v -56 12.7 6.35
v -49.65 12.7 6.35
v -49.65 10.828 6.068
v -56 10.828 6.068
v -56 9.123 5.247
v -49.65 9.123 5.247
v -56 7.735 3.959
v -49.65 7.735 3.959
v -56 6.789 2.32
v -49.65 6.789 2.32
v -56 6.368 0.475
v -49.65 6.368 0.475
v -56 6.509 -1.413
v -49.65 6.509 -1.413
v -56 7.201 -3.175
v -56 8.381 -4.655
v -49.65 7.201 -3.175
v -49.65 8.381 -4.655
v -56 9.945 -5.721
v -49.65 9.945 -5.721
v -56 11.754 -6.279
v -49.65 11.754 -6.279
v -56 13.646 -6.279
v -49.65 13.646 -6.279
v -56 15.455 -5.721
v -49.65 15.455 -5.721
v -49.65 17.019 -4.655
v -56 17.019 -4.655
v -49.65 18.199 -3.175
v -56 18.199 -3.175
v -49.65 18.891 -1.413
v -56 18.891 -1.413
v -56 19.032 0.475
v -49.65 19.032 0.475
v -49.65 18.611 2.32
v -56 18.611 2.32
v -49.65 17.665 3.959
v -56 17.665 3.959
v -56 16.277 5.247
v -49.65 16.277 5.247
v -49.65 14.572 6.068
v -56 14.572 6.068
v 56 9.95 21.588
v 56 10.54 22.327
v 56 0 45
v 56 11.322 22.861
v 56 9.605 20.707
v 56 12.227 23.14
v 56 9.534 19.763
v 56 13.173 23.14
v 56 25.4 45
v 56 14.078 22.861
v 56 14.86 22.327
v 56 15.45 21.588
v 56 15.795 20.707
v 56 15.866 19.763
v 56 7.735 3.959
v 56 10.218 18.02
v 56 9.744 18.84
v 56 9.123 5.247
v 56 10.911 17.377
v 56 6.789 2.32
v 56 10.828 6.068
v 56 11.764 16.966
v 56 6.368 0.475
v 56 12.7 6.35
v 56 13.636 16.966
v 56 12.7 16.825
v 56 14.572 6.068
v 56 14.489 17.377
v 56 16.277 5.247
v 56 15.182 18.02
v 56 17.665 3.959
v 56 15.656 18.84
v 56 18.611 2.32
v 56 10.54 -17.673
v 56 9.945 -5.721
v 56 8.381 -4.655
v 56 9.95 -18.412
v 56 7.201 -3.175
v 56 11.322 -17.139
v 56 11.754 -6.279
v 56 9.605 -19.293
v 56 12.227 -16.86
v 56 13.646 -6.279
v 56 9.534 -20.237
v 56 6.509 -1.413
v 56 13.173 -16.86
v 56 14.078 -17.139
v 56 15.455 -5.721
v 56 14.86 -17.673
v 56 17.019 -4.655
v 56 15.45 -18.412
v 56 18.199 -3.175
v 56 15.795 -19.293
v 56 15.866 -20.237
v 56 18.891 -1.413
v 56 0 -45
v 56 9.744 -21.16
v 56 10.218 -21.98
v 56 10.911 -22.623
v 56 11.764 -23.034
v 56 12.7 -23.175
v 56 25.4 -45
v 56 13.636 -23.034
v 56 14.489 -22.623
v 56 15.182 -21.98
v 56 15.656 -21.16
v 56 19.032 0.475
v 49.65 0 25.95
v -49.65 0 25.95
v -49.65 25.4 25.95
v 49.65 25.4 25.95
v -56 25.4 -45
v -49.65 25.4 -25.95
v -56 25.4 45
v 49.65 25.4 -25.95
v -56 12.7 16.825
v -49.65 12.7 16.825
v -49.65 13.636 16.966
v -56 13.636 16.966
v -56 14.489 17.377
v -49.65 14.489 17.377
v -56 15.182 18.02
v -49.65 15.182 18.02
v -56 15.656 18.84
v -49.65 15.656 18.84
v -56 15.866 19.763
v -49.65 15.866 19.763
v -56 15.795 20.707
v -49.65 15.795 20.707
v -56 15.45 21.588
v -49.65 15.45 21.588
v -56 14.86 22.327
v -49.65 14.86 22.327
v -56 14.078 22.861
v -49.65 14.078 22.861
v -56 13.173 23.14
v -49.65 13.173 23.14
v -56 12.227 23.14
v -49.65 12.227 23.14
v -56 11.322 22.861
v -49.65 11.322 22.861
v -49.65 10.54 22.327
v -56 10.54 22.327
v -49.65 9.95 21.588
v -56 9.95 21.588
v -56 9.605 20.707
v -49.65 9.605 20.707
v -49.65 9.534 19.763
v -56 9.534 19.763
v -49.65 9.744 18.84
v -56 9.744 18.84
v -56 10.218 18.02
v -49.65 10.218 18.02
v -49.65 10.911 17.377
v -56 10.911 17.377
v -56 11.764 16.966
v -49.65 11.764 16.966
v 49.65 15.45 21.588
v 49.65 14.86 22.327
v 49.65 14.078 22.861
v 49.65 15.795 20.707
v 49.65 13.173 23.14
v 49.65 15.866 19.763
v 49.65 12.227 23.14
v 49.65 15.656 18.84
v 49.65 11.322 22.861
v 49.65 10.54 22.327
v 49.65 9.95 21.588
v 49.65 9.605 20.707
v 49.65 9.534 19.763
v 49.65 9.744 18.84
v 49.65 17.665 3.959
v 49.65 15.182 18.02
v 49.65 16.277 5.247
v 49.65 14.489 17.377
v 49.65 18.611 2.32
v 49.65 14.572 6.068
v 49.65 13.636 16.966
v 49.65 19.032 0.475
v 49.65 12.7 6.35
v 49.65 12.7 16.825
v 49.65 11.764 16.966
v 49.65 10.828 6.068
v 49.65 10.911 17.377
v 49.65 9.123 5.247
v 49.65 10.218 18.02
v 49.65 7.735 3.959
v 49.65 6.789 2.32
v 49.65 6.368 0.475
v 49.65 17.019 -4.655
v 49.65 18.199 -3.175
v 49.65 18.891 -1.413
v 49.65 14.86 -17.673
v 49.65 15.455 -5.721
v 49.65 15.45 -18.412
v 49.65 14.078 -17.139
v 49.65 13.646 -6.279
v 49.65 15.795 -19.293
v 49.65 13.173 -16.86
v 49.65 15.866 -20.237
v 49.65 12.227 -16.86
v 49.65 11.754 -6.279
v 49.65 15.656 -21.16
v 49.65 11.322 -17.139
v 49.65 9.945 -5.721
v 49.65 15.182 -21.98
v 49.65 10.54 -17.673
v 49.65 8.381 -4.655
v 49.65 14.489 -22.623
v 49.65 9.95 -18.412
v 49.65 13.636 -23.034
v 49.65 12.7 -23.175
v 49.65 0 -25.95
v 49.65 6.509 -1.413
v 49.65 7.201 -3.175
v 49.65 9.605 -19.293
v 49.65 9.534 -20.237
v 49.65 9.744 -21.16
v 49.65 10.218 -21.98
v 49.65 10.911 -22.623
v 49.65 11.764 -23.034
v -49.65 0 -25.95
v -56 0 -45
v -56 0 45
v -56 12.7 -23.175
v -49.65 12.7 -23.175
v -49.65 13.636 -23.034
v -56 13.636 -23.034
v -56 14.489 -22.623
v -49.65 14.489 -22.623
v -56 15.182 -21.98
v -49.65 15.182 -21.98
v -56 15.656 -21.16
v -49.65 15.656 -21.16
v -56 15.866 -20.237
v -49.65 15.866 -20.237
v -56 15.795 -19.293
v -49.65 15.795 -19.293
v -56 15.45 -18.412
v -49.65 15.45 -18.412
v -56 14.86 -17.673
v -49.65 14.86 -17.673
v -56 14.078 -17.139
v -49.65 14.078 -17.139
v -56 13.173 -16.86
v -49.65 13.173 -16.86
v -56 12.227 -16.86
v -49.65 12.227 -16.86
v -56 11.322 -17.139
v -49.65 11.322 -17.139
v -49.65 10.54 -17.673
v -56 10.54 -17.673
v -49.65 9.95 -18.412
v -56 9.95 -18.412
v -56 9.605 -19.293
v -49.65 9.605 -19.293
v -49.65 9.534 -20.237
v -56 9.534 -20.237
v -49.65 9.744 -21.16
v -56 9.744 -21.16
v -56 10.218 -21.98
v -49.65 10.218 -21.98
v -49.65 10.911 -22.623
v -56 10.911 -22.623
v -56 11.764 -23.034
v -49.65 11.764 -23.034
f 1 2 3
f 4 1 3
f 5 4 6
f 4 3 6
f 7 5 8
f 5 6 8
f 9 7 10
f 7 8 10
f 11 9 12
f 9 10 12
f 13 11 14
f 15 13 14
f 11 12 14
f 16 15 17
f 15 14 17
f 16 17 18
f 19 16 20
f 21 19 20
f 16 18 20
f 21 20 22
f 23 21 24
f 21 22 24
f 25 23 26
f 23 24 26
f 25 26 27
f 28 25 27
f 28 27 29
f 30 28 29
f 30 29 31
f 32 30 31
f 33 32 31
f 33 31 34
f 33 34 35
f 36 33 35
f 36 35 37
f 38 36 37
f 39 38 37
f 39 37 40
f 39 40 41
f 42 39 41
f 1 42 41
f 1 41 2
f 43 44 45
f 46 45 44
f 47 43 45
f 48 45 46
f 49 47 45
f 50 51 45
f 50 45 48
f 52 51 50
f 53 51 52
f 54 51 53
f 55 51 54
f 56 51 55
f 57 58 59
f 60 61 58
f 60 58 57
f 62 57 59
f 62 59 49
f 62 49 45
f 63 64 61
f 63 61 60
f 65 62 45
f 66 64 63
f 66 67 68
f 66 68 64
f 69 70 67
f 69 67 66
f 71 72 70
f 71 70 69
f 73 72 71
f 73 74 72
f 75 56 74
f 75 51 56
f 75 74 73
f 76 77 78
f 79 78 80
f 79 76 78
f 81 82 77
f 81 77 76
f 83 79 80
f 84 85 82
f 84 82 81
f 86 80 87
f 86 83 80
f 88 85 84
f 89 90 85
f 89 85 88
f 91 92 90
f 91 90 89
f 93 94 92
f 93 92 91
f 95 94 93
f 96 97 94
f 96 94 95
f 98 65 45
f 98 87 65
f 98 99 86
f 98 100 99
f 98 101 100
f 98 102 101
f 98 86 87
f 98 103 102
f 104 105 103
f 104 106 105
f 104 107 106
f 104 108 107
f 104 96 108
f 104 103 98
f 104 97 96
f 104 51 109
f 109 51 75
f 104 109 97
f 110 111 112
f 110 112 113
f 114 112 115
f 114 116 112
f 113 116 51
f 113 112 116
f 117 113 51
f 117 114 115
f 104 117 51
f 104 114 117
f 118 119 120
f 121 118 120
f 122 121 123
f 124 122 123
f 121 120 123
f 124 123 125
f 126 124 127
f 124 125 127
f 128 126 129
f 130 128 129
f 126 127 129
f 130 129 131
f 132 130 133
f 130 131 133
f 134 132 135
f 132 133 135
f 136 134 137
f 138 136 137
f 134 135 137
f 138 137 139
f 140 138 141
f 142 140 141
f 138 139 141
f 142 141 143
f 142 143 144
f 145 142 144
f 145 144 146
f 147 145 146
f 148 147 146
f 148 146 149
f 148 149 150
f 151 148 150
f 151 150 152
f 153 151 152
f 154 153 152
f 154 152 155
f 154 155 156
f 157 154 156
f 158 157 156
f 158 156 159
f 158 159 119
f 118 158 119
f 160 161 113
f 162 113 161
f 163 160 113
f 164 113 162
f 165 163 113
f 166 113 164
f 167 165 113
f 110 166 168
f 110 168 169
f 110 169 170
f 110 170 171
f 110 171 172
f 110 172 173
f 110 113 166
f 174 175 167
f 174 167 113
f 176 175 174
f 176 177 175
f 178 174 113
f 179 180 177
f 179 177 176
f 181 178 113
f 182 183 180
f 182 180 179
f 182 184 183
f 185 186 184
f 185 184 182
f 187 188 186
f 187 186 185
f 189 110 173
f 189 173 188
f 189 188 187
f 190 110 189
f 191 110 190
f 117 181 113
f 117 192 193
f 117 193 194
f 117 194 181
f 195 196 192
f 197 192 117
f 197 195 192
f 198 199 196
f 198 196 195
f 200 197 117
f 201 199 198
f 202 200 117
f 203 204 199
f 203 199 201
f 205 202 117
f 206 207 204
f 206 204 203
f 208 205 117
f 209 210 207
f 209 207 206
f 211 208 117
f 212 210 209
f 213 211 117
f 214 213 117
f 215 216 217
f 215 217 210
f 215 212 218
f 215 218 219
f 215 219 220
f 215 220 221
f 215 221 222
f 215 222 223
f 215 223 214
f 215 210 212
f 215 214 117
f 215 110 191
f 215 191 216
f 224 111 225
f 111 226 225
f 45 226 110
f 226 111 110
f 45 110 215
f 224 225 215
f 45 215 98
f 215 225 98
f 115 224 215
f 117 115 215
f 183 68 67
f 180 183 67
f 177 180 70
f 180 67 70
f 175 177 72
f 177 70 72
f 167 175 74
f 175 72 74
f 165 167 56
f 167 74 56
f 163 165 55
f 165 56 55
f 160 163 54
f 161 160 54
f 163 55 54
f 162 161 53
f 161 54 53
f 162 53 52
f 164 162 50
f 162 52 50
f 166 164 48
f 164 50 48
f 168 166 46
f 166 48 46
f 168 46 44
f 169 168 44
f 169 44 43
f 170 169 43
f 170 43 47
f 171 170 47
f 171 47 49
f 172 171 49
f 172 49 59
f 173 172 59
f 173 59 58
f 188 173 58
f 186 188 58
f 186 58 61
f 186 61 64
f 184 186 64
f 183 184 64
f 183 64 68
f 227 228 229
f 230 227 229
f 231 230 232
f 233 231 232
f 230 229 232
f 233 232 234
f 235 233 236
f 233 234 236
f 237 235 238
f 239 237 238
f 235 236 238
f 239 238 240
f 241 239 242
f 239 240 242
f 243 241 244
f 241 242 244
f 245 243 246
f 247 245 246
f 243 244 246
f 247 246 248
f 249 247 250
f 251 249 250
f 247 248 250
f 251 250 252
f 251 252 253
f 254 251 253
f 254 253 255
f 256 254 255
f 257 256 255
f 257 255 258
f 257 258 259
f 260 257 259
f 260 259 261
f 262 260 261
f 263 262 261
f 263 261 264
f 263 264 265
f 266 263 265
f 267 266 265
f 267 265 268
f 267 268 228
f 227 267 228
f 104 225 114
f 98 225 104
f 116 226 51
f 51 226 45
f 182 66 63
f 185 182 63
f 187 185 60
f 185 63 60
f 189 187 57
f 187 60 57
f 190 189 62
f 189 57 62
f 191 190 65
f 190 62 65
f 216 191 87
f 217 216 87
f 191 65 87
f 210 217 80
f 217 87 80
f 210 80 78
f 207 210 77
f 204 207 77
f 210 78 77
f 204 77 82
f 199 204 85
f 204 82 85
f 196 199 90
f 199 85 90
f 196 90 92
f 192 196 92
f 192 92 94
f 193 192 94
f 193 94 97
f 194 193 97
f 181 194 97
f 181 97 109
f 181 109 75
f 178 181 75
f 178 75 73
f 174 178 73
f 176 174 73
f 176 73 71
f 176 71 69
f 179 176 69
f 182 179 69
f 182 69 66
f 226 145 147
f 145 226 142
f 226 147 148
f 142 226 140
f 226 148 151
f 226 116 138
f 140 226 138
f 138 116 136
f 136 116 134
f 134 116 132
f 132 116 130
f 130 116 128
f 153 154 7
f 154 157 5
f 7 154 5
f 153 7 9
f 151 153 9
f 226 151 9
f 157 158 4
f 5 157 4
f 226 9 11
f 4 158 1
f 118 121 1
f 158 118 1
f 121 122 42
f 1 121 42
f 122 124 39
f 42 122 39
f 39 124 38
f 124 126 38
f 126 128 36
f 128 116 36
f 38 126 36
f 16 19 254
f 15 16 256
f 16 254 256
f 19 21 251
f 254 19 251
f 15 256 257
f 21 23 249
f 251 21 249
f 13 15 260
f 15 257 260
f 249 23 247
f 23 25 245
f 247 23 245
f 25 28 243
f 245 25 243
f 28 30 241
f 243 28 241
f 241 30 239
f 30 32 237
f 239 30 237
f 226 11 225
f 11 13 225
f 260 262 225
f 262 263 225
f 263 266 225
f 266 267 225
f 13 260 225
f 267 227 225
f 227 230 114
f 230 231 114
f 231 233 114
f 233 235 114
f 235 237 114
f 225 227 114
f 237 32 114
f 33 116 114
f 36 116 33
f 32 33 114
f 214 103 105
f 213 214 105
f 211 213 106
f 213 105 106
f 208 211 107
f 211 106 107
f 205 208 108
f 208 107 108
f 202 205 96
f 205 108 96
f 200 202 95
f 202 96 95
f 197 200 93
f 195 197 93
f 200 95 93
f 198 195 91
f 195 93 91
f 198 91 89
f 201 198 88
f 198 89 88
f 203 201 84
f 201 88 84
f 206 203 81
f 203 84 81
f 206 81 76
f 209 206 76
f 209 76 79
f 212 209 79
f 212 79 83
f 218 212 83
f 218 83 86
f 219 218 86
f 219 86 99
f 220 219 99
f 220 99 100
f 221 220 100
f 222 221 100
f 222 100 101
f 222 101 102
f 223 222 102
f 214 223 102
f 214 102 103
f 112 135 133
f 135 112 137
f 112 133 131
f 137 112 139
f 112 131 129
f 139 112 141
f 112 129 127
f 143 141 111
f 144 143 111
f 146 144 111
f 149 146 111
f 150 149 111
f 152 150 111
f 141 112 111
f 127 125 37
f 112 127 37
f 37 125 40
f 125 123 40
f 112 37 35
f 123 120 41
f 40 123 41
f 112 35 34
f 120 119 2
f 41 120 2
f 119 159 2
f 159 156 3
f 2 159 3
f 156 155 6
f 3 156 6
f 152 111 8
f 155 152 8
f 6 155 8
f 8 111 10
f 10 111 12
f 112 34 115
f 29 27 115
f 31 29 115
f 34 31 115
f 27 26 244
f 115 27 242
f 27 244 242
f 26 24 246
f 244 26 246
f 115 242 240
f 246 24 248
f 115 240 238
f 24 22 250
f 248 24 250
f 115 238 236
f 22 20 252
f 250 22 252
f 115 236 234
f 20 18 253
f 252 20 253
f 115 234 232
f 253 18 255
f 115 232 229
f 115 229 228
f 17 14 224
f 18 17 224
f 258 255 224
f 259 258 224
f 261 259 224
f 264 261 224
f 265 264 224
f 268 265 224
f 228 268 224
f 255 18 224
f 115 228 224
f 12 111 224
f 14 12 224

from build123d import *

# Parameters (mm, degrees)
CROQUIS1_W              = 150.1
CROQUIS1_H              = 90
CROQUIS1_W_2            = 99.3
CROQUIS1_H_2            = 51.9
SALIENTE_EXTRUIR1_DEPTH = 25.4
CROQUIS2_R              = 6.35
SALIENTE_EXTRUIR2_DEPTH = 51.85
SALIENTE_EXTRUIR3_START = -174.15
CROQUIS2_2_R            = 6.35
SALIENTE_EXTRUIR3_DEPTH = 24.05
CROQUIS4_R              = 3.175
CORTAR_EXTRUIR2_DEPTH   = 182.654569169
CORTAR_EXTRUIR3_START   = 51.85
CROQUIS2_3_R            = 6.35
CORTAR_EXTRUIR3_DEPTH   = 234.504569169
CROQUIS6_W              = 19.05
CROQUIS6_H              = 90
CORTAR_EXTRUIR4_DEPTH   = 92.118946987


with BuildPart() as part:
    # Croquis1 → Saliente-Extruir1 (new body)
    with BuildSketch(Plane(origin=(0, 0, 0), x_dir=(1, 0, 0), z_dir=(0, 1, 0))):
        Rectangle(CROQUIS1_W, CROQUIS1_H)
        Rectangle(CROQUIS1_W_2, CROQUIS1_H_2, mode=Mode.SUBTRACT)
    extrude(amount=SALIENTE_EXTRUIR1_DEPTH)

    # Croquis2 → Saliente-Extruir2 (add)
    with BuildSketch(Plane(origin=(75.05, 0, 0), x_dir=(0, 0, -1), z_dir=(1, 0, 0))):
        with Locations(Location((0, 12.7, 0), (0, 0, 180))):
            Circle(CROQUIS2_R)
    extrude(amount=SALIENTE_EXTRUIR2_DEPTH)

    # Croquis2<2> → Saliente-Extruir3 (add)
    with BuildSketch(Plane(origin=(75.05, 0, 0), x_dir=(0, 0, -1), z_dir=(1, 0, 0)).offset(SALIENTE_EXTRUIR3_START)):
        with Locations(Location((0, 12.7, 0), (0, 0, 180))):
            Circle(CROQUIS2_2_R)
    extrude(amount=SALIENTE_EXTRUIR3_DEPTH)

    # Croquis4 → Cortar-Extruir2 (cut, through all)
    with BuildSketch(Plane(origin=(75.05, 0, 0), x_dir=(0, 0, -1), z_dir=(1, 0, 0))):
        with Locations((-20, 12.7)):
            Circle(CROQUIS4_R)
        with Locations((20, 12.7)):
            Circle(CROQUIS4_R)
    extrude(amount=-CORTAR_EXTRUIR2_DEPTH, mode=Mode.SUBTRACT)

    # Croquis2<3> → Cortar-Extruir3 (cut, through all)
    with BuildSketch(Plane(origin=(75.05, 0, 0), x_dir=(0, 0, -1), z_dir=(1, 0, 0)).offset(CORTAR_EXTRUIR3_START)):
        with Locations(Location((0, 12.7, 0), (0, 0, 180))):
            Circle(CROQUIS2_3_R)
    extrude(amount=-CORTAR_EXTRUIR3_DEPTH, mode=Mode.SUBTRACT)

    # Croquis6 → Cortar-Extruir4 (cut, through all)
    with BuildSketch(Plane(origin=(0, 25.4, 0), x_dir=(1, 0, 0), z_dir=(0, 1, 0))):
        with Locations((-65.525, 0)):
            Rectangle(CROQUIS6_W, CROQUIS6_H)
        with Locations((65.525, 0)):
            Rectangle(CROQUIS6_W, CROQUIS6_H)
    extrude(amount=-CORTAR_EXTRUIR4_DEPTH, mode=Mode.SUBTRACT)


solid = part.part
